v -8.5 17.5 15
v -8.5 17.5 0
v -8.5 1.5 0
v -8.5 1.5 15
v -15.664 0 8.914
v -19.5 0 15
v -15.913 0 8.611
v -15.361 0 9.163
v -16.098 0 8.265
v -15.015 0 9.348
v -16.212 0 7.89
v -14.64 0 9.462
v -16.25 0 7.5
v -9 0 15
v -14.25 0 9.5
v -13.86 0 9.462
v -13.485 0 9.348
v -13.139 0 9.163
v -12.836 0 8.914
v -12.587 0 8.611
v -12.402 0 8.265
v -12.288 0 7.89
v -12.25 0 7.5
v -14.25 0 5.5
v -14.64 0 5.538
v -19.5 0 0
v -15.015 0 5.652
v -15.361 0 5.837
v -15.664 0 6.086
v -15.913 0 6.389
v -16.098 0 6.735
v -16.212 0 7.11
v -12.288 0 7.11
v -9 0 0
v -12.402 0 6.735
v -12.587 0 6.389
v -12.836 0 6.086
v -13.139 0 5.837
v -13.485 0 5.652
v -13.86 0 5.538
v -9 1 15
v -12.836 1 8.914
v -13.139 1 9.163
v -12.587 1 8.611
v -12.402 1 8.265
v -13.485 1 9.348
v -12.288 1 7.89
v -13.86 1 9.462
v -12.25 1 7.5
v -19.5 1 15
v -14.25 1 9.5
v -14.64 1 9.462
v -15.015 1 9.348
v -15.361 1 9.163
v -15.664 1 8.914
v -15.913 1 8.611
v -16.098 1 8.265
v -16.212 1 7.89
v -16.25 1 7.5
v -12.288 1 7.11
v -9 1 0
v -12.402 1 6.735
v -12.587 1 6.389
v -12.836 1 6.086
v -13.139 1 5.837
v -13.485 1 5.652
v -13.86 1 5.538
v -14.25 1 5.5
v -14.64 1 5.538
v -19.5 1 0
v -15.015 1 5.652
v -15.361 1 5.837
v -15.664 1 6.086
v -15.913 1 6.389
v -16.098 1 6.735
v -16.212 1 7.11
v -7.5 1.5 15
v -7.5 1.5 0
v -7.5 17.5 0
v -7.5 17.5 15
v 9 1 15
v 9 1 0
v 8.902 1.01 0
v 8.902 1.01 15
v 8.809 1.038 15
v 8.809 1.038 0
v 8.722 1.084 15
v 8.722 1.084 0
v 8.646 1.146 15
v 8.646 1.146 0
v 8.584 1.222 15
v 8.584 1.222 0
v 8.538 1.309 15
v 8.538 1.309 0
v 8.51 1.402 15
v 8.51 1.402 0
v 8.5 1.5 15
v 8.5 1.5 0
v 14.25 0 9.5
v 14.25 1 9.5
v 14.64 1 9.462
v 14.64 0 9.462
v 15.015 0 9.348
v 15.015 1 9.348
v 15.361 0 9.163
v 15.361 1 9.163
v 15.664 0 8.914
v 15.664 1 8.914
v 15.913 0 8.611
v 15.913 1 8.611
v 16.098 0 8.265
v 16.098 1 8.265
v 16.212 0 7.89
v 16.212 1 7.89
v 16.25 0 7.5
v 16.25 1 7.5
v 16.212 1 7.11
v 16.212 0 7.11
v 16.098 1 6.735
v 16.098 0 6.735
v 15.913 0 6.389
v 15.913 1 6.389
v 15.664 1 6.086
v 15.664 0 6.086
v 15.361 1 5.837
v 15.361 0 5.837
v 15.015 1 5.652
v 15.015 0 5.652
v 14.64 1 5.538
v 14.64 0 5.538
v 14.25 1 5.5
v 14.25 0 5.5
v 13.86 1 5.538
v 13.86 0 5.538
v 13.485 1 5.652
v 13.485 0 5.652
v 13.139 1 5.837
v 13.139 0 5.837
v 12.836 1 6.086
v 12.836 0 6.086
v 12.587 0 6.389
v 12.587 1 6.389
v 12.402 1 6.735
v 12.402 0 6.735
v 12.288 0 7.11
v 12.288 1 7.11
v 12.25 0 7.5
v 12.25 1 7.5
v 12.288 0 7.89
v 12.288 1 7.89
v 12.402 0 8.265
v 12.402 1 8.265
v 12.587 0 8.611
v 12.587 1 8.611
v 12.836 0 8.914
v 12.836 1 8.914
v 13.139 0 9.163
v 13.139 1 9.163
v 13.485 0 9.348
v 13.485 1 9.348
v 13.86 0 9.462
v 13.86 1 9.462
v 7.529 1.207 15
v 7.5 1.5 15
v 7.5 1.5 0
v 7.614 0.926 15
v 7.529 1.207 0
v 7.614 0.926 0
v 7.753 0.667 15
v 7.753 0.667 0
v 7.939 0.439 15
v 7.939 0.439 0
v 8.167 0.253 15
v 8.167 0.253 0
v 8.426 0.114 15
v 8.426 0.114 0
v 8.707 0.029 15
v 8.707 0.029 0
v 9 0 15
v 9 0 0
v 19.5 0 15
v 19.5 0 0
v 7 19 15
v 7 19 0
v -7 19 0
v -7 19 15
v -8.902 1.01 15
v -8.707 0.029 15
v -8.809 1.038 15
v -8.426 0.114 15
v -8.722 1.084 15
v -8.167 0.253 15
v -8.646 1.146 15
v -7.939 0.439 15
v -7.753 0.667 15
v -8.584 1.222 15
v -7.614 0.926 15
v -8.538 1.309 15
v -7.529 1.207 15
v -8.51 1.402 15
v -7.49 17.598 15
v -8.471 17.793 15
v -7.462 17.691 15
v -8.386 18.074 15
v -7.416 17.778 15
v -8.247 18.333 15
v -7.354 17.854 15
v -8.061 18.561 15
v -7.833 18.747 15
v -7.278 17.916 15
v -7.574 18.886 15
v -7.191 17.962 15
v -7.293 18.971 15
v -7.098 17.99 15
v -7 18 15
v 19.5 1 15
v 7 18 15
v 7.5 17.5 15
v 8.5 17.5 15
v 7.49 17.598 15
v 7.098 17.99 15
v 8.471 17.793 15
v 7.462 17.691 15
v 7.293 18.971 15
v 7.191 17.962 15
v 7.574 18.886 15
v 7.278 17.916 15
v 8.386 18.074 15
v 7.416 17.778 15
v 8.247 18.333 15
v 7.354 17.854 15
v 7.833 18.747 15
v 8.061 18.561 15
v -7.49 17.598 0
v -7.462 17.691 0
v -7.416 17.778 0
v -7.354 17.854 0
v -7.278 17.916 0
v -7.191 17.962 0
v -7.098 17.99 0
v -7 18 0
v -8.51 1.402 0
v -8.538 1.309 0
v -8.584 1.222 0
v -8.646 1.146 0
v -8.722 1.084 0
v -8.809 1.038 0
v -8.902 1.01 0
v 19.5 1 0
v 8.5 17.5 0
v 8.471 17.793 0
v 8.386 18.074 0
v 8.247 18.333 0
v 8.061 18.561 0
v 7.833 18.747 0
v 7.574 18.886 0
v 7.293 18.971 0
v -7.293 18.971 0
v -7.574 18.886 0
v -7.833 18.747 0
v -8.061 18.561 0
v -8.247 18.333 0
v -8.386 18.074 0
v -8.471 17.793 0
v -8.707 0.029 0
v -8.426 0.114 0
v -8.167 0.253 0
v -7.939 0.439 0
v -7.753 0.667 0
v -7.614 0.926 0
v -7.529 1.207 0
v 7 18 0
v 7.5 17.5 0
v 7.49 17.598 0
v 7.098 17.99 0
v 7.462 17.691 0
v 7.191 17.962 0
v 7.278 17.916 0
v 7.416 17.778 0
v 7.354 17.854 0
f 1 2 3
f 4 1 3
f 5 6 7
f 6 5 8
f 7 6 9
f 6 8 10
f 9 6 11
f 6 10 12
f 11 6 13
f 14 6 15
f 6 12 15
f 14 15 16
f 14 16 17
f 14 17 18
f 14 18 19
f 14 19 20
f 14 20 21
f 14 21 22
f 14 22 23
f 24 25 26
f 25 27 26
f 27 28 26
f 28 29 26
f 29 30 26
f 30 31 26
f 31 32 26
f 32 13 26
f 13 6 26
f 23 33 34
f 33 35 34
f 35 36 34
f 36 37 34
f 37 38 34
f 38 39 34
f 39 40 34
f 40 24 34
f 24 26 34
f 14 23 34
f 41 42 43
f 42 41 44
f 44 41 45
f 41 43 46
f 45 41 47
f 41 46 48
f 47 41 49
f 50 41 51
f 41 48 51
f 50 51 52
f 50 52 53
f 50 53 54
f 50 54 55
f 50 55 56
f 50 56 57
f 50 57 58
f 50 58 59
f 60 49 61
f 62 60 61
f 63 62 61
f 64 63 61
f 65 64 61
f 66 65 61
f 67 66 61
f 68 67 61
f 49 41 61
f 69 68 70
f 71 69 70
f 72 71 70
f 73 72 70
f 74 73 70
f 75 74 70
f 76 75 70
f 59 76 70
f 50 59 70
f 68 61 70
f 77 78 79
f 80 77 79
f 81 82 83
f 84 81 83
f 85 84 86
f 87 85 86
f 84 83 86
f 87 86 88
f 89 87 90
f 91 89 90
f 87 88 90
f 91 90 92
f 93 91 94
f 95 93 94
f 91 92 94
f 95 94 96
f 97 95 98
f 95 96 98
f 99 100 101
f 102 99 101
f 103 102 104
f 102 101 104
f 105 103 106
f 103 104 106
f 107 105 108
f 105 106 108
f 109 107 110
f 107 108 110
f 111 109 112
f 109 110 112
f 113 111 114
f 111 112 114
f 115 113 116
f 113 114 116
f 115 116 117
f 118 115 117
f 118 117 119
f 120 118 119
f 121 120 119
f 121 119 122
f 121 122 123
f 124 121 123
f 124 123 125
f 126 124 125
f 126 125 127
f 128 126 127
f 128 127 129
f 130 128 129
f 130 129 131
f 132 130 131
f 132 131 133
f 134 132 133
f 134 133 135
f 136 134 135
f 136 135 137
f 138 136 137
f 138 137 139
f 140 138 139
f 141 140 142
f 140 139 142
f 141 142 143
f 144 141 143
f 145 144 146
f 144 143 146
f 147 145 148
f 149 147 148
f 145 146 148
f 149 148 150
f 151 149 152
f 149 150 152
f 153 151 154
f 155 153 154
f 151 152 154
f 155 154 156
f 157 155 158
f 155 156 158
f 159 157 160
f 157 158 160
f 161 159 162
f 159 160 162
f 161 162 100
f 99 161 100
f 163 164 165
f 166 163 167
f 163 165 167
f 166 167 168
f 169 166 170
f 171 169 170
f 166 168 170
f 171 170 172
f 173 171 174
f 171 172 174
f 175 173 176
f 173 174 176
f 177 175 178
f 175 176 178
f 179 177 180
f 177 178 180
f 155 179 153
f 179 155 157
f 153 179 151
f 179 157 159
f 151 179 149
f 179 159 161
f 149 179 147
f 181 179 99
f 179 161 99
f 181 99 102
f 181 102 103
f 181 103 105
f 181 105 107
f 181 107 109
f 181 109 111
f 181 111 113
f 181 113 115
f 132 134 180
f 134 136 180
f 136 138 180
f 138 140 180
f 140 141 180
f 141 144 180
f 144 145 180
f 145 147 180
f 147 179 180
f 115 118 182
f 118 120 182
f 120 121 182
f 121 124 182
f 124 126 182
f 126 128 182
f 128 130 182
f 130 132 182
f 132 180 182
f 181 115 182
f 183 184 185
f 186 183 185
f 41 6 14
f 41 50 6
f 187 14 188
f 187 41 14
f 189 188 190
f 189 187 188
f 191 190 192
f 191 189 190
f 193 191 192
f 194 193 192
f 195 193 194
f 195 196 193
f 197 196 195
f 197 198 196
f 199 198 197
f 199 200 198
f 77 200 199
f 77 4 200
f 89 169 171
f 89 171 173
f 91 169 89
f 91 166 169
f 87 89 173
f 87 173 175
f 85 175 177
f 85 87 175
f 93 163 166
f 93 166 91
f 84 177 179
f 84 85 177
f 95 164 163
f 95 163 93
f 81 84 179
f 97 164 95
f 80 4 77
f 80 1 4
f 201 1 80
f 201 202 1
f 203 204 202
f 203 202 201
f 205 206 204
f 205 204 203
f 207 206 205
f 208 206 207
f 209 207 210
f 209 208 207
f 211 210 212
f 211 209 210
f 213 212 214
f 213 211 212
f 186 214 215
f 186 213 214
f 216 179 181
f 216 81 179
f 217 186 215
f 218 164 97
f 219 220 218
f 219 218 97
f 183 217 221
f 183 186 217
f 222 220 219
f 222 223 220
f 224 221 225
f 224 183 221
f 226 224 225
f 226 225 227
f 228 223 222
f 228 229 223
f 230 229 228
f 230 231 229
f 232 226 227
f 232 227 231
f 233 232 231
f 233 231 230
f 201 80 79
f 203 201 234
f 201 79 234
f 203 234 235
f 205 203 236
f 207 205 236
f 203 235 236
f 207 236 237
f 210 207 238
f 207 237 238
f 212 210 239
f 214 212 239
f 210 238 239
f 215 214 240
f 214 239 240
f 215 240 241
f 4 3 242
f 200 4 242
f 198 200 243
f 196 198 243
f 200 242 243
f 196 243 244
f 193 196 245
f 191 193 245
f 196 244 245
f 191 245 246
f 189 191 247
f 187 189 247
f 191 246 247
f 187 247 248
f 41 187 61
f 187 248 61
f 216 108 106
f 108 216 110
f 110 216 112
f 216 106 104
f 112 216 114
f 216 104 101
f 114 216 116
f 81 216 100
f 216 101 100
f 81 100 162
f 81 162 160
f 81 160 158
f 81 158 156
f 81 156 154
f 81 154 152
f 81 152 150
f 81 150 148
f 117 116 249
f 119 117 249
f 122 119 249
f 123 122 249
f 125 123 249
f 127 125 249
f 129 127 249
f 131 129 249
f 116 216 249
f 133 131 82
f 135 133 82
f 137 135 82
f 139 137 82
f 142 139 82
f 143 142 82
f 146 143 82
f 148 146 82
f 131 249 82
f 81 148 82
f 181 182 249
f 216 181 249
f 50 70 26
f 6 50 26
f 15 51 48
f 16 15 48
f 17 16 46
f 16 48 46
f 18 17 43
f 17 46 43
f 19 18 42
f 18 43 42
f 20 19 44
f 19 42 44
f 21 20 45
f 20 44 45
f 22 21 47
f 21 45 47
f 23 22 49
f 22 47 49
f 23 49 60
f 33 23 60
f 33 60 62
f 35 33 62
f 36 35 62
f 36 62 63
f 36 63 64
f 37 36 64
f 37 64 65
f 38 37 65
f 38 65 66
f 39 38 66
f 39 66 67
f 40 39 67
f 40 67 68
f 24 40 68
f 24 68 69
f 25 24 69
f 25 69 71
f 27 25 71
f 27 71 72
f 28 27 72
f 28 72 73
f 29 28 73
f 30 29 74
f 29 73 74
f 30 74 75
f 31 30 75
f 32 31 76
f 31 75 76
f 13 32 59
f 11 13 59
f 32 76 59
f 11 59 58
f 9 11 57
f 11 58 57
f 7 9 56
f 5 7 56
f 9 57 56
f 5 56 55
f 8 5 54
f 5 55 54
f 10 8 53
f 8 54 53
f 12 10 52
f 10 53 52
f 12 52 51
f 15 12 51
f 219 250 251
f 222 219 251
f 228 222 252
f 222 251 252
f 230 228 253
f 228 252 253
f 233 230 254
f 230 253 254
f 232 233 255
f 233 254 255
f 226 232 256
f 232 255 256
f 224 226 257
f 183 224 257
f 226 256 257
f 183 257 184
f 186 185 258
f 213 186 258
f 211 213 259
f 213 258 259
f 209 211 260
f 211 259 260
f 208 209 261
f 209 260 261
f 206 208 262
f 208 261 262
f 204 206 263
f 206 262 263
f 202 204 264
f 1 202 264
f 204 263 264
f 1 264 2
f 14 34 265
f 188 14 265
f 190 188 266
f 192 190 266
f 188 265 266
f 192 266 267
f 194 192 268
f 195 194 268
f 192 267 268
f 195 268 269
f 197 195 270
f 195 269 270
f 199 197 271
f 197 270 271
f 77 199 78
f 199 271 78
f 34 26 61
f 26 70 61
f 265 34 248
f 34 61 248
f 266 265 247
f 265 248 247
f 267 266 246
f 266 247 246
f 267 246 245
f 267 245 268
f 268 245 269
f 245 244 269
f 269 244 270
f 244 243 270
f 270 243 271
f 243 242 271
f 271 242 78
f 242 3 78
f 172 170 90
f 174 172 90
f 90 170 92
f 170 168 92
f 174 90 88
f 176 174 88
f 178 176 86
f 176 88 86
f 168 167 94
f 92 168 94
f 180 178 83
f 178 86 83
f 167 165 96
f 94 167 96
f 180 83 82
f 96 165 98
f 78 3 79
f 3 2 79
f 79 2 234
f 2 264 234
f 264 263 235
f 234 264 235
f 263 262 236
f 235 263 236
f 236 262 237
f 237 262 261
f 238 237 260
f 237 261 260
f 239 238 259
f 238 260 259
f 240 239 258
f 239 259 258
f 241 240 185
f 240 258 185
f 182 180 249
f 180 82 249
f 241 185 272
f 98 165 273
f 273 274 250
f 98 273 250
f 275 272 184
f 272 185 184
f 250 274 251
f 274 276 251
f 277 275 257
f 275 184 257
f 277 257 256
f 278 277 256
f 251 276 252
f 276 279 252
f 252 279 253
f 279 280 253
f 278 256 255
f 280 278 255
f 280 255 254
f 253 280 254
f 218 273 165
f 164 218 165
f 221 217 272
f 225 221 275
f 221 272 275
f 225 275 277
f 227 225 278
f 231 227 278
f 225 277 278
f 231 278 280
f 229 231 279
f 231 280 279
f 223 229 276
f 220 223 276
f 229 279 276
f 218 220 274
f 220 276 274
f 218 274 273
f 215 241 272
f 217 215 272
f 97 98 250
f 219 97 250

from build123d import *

# Parameters (mm, degrees)
FLANGE_BASE1_DEPTH    = 15
ESBO_O3_R             = 2
CORTE_EXTRUS_O2_DEPTH = 10


# Sheet-metal steps are written as plain solids
with BuildPart() as part:
    # Esboço1 → Flange-base1 (new body)
    with BuildSketch(Plane.XY):
        with BuildLine():
            Line((-19.5, 0), (-9, 0))
            ThreePointArc((-9, 0), (-7.939339828, 0.439339828), (-7.5, 1.5))
            Line((-7.5, 1.5), (-7.5, 17.5))
            ThreePointArc((-7.5, 17.5), (-7.353553391, 17.853553391), (-7, 18))
            Line((-7, 18), (7, 18))
            ThreePointArc((7, 18), (7.353553391, 17.853553391), (7.5, 17.5))
            Line((7.5, 17.5), (7.5, 1.5))
            ThreePointArc((7.5, 1.5), (7.939339828, 0.439339828), (9, 0))
            Line((9, 0), (19.5, 0))
            Line((19.5, 0), (19.5, 1))
            Line((19.5, 1), (9, 1))
            ThreePointArc((9, 1), (8.646446609, 1.146446609), (8.5, 1.5))
            Line((8.5, 1.5), (8.5, 17.5))
            ThreePointArc((8.5, 17.5), (8.060660172, 18.560660172), (7, 19))
            Line((7, 19), (-7, 19))
            ThreePointArc((-7, 19), (-8.060660172, 18.560660172), (-8.5, 17.5))
            Line((-8.5, 17.5), (-8.5, 1.5))
            ThreePointArc((-8.5, 1.5), (-8.646446609, 1.146446609), (-9, 1))
            Line((-9, 1), (-19.5, 1))
            Line((-19.5, 1), (-19.5, 0))
        make_face()
    extrude(amount=FLANGE_BASE1_DEPTH)

    # Esboço3 → Corte-extrusão2 (cut)
    with BuildSketch(Plane(origin=(0, 1, 0), x_dir=(1, 0, 0), z_dir=(0, 1, 0))):
        with Locations(Location((-14.25, -7.5, 0), (0, 0, 270))):
            Circle(ESBO_O3_R)
        with Locations(Location((14.25, -7.5, 0), (0, 0, 270))):
            Circle(ESBO_O3_R)
    extrude(amount=-CORTE_EXTRUS_O2_DEPTH, mode=Mode.SUBTRACT)


solid = part.part
